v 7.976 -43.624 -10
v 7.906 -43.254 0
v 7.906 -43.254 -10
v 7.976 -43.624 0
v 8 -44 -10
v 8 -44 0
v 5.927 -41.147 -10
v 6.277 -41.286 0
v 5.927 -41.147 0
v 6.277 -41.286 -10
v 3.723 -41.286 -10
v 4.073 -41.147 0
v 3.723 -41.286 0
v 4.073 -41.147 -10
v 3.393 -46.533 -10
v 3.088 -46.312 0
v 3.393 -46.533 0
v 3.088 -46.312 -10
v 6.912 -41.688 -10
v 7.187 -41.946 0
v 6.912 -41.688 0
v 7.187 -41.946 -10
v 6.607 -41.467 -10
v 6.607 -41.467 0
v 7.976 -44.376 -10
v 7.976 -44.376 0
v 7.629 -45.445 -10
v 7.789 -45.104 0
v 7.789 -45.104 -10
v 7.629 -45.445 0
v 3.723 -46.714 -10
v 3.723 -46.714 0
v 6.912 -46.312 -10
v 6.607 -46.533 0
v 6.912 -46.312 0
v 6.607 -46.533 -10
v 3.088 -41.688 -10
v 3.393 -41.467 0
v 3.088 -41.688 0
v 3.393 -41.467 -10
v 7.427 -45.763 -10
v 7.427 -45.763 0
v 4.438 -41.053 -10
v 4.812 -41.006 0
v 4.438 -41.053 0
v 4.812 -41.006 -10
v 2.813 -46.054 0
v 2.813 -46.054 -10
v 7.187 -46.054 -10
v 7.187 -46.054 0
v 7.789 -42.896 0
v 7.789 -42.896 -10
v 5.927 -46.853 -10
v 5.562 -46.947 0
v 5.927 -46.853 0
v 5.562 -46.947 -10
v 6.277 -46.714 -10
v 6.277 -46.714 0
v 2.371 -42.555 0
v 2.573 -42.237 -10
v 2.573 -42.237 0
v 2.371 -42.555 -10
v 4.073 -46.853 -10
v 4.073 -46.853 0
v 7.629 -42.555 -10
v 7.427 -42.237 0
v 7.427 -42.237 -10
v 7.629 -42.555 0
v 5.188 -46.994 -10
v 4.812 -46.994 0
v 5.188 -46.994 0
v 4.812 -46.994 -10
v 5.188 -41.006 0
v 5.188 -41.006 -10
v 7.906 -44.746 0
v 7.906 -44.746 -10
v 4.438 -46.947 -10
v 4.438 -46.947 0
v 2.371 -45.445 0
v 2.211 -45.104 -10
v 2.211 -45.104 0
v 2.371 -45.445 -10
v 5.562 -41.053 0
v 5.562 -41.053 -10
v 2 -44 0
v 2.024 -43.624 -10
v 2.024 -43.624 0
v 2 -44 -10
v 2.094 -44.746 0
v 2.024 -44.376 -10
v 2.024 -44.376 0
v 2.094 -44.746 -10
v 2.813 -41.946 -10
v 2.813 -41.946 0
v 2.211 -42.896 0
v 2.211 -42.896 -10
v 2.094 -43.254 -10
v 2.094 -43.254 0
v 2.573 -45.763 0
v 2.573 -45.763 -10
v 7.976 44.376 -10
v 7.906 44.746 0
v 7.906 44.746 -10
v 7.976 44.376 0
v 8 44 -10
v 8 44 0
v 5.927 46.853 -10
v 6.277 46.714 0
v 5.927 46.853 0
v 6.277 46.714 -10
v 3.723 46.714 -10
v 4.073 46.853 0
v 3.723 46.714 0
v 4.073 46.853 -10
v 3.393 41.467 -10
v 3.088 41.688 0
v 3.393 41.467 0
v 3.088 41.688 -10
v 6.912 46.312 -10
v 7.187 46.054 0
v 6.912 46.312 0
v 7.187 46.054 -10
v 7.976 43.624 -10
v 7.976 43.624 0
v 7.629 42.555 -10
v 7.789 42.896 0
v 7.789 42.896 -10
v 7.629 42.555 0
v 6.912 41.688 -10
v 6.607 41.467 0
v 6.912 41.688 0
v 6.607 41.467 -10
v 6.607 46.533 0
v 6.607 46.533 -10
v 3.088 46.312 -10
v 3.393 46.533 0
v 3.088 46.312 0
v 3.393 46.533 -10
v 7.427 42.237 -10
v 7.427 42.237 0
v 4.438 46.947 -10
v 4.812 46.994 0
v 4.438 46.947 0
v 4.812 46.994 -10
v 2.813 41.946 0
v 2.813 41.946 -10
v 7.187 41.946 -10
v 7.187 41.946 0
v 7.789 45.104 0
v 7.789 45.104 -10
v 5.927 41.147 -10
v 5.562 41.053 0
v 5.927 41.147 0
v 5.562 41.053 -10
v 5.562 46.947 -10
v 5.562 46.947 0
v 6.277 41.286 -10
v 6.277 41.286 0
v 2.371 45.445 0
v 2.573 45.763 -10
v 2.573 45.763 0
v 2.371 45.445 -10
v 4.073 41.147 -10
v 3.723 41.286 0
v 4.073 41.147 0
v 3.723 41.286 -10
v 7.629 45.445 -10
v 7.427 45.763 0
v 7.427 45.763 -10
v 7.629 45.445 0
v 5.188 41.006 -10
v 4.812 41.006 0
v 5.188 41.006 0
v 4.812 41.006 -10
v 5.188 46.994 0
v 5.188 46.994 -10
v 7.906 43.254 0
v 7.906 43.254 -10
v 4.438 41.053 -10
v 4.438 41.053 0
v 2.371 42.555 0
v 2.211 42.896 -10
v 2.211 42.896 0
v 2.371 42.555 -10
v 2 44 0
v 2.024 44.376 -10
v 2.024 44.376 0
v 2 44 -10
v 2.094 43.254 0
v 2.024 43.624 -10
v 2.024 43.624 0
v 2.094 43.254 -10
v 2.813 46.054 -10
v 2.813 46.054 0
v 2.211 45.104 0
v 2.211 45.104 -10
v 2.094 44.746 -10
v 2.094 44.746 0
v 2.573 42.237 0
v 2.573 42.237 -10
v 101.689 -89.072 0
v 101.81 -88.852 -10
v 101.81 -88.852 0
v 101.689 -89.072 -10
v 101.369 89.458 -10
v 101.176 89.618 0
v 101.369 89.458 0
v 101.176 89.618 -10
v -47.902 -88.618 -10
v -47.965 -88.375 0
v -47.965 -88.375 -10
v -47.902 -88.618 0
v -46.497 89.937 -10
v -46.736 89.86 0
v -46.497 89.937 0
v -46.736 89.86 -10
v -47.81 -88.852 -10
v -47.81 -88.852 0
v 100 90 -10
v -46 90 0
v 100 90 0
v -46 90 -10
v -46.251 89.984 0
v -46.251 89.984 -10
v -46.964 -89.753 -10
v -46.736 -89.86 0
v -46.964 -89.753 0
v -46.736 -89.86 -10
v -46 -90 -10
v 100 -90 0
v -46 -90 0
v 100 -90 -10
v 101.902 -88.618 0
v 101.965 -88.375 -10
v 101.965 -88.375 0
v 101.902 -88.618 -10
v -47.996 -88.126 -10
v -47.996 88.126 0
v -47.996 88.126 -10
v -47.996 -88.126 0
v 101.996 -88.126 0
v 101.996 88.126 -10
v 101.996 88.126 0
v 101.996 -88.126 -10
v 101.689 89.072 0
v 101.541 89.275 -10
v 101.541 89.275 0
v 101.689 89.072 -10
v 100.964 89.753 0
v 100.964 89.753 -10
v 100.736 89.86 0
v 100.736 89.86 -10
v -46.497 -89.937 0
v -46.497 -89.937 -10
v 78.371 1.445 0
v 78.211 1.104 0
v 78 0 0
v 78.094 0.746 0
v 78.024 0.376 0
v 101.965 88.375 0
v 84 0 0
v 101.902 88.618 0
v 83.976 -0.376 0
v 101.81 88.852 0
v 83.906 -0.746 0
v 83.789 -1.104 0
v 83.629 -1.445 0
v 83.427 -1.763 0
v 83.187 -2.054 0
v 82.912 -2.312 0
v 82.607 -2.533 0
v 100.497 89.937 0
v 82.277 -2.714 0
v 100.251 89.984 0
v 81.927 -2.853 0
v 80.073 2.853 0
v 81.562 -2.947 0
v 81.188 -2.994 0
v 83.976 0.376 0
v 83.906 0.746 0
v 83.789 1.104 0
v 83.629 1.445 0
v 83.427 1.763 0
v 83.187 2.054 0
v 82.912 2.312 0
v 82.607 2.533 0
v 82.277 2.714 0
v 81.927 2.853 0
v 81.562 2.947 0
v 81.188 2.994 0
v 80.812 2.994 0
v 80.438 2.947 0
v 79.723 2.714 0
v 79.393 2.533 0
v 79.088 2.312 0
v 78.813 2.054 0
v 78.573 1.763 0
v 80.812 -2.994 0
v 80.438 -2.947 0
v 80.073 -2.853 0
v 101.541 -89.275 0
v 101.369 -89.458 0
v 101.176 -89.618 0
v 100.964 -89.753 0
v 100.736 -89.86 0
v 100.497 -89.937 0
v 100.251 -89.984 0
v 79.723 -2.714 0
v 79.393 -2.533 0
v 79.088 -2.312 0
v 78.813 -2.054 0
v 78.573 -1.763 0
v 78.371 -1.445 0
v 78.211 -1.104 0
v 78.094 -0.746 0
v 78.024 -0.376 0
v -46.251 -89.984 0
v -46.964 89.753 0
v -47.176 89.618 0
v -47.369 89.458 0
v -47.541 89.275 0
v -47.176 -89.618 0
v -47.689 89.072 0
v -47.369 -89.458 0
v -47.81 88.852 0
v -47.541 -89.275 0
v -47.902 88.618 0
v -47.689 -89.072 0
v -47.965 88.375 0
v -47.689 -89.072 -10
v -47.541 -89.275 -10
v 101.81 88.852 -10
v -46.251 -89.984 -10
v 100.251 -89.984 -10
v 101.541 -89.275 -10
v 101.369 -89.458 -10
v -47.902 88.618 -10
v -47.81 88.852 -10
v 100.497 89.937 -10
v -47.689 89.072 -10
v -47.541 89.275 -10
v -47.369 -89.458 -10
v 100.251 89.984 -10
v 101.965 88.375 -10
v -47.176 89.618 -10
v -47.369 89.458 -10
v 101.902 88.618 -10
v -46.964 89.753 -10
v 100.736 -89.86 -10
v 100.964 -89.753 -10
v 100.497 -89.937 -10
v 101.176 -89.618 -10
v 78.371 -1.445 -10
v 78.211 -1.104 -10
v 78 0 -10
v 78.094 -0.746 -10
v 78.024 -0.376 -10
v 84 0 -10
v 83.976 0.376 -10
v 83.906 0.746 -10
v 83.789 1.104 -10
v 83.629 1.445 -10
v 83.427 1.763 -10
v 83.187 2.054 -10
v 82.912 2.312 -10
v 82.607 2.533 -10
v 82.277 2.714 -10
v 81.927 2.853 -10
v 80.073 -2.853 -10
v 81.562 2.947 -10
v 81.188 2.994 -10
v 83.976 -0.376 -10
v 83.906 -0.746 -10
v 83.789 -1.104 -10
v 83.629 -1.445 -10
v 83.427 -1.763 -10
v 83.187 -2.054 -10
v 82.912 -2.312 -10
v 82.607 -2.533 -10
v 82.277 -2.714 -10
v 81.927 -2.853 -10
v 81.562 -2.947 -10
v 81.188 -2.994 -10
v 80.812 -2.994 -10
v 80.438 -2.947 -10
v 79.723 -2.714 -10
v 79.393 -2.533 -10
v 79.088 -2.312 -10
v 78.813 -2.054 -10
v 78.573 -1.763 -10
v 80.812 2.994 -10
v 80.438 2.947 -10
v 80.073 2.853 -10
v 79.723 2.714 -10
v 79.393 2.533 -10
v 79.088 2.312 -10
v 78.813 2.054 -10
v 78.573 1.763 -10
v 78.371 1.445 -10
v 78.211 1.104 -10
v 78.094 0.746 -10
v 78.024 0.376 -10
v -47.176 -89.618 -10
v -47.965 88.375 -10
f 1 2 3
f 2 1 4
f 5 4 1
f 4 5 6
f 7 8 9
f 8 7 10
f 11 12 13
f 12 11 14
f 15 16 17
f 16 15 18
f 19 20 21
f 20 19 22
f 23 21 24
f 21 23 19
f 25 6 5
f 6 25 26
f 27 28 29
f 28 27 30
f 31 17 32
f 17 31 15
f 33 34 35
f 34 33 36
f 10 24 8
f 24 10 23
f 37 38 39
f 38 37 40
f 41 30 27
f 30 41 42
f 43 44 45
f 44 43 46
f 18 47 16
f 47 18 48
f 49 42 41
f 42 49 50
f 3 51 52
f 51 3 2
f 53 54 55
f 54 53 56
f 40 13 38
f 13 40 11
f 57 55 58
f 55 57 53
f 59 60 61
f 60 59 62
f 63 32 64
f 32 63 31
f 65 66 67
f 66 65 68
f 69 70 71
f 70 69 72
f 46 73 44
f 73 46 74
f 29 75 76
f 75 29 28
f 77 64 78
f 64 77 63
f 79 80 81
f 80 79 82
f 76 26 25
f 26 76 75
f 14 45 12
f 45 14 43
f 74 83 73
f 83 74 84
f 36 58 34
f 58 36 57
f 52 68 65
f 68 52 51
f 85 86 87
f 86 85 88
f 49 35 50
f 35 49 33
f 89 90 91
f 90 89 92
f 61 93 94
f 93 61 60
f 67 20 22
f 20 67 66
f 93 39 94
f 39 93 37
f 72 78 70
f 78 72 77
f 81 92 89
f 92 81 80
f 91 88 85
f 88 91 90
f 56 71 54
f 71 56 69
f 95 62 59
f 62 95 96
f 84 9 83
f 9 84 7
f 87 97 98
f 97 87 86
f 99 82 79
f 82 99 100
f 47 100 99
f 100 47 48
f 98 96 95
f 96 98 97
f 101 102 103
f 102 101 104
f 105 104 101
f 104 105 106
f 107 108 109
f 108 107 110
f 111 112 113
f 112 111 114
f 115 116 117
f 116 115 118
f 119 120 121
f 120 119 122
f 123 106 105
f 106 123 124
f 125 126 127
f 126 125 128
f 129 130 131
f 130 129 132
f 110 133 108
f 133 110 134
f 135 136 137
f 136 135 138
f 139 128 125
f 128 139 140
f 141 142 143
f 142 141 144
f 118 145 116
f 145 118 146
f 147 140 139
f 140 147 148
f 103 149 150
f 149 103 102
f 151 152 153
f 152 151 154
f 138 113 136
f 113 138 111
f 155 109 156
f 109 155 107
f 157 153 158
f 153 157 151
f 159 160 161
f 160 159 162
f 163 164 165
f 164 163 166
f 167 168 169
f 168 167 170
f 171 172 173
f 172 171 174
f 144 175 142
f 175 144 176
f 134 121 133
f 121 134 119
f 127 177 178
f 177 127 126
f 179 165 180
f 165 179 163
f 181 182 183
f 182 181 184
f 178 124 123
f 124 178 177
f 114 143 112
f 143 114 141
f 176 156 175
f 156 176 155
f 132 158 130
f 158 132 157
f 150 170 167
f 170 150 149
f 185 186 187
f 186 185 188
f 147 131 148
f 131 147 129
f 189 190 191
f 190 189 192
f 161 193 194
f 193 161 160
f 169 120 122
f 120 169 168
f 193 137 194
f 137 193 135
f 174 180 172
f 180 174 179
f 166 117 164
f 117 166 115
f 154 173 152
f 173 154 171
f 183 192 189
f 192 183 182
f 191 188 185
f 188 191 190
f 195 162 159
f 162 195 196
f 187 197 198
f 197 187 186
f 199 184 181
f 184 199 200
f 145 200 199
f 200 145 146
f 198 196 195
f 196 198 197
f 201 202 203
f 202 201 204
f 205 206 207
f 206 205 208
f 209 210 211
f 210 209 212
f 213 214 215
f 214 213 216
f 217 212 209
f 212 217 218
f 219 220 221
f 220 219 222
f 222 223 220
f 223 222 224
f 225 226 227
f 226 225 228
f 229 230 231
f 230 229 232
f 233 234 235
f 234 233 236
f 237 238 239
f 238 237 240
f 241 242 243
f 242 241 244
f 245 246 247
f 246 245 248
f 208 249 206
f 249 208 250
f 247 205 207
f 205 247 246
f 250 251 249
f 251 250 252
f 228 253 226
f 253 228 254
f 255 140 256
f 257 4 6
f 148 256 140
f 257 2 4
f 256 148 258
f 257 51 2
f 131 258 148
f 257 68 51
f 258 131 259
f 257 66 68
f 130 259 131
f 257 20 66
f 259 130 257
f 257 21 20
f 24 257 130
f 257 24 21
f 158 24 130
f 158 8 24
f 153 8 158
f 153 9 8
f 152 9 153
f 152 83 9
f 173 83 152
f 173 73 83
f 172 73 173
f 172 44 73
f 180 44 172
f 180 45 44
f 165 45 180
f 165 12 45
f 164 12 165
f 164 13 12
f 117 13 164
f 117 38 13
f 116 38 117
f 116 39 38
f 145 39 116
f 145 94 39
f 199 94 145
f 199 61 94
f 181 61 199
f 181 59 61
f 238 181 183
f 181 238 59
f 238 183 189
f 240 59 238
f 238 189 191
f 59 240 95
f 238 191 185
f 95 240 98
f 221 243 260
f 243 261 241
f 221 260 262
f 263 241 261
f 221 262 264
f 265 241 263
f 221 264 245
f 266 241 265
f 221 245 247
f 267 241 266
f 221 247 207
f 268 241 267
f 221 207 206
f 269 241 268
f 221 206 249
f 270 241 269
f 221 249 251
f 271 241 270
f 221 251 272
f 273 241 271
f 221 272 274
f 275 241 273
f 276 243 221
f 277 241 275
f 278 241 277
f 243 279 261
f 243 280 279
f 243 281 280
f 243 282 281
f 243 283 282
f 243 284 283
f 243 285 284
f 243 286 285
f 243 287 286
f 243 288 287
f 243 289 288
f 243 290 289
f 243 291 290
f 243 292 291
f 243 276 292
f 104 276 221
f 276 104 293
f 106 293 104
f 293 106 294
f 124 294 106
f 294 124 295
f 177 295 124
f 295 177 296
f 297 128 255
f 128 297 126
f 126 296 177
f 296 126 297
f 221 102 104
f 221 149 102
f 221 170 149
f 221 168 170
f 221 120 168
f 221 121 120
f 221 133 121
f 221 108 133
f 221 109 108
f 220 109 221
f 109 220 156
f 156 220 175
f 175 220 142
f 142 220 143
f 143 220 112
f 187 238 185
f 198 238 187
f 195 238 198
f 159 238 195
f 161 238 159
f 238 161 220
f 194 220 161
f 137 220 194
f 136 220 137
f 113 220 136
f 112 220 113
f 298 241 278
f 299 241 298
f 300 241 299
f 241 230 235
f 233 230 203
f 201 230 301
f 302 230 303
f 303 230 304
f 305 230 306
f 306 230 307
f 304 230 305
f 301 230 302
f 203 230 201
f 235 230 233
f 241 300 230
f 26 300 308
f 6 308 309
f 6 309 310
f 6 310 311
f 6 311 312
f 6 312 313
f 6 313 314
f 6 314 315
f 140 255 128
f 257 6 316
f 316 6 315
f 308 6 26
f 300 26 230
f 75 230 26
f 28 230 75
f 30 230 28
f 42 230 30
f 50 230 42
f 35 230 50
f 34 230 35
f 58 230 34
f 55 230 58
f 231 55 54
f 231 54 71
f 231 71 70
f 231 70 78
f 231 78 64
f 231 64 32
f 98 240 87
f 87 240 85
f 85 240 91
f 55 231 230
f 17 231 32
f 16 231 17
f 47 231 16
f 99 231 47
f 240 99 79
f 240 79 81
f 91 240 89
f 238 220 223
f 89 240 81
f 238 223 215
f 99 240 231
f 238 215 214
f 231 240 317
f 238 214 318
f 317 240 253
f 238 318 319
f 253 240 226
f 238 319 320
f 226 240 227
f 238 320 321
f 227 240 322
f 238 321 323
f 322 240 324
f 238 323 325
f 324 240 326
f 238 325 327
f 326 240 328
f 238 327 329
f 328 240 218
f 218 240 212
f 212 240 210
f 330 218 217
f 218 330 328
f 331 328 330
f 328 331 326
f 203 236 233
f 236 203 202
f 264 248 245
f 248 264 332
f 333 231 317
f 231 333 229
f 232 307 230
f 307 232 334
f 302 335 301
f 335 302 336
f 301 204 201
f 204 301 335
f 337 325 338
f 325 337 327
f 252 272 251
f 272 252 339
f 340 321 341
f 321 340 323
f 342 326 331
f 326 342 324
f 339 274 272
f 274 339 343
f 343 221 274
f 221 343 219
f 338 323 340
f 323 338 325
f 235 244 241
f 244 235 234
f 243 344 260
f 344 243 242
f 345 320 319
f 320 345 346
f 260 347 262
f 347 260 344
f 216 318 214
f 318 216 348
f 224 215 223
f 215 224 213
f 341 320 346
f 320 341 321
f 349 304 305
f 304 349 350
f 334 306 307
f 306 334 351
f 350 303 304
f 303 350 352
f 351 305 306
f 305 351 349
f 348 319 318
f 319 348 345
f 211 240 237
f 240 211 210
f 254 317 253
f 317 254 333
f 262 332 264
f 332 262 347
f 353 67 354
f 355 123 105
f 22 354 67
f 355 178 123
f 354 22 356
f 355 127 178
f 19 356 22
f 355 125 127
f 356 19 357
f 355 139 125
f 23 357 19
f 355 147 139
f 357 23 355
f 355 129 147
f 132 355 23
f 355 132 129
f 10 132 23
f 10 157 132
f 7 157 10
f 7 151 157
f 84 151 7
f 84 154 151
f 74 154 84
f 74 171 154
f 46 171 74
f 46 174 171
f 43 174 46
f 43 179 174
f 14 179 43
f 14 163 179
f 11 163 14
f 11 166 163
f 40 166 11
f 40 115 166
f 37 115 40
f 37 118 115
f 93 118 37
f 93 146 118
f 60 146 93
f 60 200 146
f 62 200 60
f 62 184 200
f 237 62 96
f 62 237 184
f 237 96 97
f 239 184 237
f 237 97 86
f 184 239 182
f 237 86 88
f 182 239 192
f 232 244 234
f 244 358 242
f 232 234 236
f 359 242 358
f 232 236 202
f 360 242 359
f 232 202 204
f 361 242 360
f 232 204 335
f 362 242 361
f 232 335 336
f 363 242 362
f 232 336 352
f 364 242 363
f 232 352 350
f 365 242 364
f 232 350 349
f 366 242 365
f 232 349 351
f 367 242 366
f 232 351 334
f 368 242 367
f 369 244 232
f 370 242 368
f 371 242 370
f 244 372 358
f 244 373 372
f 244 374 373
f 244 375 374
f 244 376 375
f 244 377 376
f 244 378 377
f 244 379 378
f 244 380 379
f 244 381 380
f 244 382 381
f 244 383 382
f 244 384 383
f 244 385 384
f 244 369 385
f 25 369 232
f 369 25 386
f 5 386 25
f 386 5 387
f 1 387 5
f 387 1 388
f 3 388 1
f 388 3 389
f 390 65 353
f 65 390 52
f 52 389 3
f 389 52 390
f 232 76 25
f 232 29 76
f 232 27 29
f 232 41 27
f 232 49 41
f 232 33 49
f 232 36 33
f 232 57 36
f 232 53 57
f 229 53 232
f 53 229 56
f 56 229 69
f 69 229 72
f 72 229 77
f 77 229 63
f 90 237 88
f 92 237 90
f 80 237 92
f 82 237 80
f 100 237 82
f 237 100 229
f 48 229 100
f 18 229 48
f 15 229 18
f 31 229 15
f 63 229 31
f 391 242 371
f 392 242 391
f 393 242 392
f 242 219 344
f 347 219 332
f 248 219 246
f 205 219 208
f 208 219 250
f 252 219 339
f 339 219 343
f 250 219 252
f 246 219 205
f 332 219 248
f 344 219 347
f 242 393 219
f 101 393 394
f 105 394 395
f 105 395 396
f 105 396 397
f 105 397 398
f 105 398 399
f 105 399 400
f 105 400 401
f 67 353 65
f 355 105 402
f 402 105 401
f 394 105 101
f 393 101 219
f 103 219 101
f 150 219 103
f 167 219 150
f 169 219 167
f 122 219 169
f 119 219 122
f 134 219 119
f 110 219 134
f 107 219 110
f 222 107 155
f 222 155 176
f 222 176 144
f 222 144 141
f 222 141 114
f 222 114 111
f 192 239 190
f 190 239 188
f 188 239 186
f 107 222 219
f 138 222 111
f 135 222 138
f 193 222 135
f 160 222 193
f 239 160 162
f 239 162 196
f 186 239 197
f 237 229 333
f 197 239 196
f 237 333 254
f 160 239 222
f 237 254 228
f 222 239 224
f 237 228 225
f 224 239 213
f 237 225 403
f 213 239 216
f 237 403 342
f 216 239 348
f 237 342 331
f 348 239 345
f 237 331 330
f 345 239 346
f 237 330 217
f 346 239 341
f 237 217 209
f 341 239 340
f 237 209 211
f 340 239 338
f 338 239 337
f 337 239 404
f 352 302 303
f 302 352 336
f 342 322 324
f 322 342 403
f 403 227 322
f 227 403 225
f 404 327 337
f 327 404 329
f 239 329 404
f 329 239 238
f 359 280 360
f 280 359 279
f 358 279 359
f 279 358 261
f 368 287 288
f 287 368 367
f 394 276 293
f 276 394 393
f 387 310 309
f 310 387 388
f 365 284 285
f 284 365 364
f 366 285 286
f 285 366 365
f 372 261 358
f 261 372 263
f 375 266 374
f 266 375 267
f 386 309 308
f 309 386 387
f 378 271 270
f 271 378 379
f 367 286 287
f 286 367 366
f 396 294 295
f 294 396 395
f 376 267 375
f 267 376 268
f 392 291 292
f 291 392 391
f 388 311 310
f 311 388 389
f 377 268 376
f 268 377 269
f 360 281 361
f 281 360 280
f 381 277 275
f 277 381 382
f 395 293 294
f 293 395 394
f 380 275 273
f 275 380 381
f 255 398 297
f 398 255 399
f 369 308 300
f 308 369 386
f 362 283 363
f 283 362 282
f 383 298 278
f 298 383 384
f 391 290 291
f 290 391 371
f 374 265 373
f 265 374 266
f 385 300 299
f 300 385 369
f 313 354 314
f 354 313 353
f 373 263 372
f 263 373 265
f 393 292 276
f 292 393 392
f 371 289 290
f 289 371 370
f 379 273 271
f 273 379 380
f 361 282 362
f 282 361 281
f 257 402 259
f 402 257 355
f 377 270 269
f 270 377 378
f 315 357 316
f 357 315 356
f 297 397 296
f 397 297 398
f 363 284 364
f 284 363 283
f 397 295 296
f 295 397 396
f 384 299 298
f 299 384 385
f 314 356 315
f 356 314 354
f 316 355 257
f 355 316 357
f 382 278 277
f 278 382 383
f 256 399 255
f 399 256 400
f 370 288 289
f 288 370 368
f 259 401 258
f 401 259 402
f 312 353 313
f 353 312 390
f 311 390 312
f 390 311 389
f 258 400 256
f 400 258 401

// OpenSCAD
// speaker seat parameters
w_speaker_seat = 180;
l_speaker_seat = 150;
h_speaker_seat = 10;
r_plate_corner = 2;

// support arm parameters
l_arm = 130;
h_arm = 40.2;
w_arm = 20.25;
d_arm_under_seat = 100;
d_holes = 6;
support_thickness = 4;
$fn=50;

// TODO: break into 2; speaker seat and arm parts for easier printing

module speaker_seat() {
    w_offset = w_speaker_seat-2*r_plate_corner;
    l_offset = l_speaker_seat-2*r_plate_corner;
    difference() {        
        translate([d_arm_under_seat,-w_offset/2,-h_speaker_seat/2]) {
            rotate([0,0,90])
            // minkowski sum to get rounded corners
            minkowski() {        
                // square plate; h/2 because minkowski sums in all dimensions
                cube([w_offset, l_offset, h_speaker_seat/2], center=true);
                // rounded corners; h/2 because minkowski sums in all dimensions
                translate([w_offset/2, l_offset/2, 0])
                cylinder(h=h_speaker_seat/2, r=r_plate_corner,center=true);
            }
        }
        // holes perpindicular to direction of arm
        for (i=[-1:2:1]) {
            translate([h_speaker_seat/2,i*(d_arm_under_seat/2-d_holes),-h_speaker_seat/2])
            cylinder(r=d_holes/2, h=2*h_speaker_seat, center=true);
        }
        // holes in direction of arm
        translate([d_arm_under_seat-19,0,-h_speaker_seat/2])
        cylinder(r=d_holes/2, h=2*h_speaker_seat, center=true);
    }
}

speaker_seat();
